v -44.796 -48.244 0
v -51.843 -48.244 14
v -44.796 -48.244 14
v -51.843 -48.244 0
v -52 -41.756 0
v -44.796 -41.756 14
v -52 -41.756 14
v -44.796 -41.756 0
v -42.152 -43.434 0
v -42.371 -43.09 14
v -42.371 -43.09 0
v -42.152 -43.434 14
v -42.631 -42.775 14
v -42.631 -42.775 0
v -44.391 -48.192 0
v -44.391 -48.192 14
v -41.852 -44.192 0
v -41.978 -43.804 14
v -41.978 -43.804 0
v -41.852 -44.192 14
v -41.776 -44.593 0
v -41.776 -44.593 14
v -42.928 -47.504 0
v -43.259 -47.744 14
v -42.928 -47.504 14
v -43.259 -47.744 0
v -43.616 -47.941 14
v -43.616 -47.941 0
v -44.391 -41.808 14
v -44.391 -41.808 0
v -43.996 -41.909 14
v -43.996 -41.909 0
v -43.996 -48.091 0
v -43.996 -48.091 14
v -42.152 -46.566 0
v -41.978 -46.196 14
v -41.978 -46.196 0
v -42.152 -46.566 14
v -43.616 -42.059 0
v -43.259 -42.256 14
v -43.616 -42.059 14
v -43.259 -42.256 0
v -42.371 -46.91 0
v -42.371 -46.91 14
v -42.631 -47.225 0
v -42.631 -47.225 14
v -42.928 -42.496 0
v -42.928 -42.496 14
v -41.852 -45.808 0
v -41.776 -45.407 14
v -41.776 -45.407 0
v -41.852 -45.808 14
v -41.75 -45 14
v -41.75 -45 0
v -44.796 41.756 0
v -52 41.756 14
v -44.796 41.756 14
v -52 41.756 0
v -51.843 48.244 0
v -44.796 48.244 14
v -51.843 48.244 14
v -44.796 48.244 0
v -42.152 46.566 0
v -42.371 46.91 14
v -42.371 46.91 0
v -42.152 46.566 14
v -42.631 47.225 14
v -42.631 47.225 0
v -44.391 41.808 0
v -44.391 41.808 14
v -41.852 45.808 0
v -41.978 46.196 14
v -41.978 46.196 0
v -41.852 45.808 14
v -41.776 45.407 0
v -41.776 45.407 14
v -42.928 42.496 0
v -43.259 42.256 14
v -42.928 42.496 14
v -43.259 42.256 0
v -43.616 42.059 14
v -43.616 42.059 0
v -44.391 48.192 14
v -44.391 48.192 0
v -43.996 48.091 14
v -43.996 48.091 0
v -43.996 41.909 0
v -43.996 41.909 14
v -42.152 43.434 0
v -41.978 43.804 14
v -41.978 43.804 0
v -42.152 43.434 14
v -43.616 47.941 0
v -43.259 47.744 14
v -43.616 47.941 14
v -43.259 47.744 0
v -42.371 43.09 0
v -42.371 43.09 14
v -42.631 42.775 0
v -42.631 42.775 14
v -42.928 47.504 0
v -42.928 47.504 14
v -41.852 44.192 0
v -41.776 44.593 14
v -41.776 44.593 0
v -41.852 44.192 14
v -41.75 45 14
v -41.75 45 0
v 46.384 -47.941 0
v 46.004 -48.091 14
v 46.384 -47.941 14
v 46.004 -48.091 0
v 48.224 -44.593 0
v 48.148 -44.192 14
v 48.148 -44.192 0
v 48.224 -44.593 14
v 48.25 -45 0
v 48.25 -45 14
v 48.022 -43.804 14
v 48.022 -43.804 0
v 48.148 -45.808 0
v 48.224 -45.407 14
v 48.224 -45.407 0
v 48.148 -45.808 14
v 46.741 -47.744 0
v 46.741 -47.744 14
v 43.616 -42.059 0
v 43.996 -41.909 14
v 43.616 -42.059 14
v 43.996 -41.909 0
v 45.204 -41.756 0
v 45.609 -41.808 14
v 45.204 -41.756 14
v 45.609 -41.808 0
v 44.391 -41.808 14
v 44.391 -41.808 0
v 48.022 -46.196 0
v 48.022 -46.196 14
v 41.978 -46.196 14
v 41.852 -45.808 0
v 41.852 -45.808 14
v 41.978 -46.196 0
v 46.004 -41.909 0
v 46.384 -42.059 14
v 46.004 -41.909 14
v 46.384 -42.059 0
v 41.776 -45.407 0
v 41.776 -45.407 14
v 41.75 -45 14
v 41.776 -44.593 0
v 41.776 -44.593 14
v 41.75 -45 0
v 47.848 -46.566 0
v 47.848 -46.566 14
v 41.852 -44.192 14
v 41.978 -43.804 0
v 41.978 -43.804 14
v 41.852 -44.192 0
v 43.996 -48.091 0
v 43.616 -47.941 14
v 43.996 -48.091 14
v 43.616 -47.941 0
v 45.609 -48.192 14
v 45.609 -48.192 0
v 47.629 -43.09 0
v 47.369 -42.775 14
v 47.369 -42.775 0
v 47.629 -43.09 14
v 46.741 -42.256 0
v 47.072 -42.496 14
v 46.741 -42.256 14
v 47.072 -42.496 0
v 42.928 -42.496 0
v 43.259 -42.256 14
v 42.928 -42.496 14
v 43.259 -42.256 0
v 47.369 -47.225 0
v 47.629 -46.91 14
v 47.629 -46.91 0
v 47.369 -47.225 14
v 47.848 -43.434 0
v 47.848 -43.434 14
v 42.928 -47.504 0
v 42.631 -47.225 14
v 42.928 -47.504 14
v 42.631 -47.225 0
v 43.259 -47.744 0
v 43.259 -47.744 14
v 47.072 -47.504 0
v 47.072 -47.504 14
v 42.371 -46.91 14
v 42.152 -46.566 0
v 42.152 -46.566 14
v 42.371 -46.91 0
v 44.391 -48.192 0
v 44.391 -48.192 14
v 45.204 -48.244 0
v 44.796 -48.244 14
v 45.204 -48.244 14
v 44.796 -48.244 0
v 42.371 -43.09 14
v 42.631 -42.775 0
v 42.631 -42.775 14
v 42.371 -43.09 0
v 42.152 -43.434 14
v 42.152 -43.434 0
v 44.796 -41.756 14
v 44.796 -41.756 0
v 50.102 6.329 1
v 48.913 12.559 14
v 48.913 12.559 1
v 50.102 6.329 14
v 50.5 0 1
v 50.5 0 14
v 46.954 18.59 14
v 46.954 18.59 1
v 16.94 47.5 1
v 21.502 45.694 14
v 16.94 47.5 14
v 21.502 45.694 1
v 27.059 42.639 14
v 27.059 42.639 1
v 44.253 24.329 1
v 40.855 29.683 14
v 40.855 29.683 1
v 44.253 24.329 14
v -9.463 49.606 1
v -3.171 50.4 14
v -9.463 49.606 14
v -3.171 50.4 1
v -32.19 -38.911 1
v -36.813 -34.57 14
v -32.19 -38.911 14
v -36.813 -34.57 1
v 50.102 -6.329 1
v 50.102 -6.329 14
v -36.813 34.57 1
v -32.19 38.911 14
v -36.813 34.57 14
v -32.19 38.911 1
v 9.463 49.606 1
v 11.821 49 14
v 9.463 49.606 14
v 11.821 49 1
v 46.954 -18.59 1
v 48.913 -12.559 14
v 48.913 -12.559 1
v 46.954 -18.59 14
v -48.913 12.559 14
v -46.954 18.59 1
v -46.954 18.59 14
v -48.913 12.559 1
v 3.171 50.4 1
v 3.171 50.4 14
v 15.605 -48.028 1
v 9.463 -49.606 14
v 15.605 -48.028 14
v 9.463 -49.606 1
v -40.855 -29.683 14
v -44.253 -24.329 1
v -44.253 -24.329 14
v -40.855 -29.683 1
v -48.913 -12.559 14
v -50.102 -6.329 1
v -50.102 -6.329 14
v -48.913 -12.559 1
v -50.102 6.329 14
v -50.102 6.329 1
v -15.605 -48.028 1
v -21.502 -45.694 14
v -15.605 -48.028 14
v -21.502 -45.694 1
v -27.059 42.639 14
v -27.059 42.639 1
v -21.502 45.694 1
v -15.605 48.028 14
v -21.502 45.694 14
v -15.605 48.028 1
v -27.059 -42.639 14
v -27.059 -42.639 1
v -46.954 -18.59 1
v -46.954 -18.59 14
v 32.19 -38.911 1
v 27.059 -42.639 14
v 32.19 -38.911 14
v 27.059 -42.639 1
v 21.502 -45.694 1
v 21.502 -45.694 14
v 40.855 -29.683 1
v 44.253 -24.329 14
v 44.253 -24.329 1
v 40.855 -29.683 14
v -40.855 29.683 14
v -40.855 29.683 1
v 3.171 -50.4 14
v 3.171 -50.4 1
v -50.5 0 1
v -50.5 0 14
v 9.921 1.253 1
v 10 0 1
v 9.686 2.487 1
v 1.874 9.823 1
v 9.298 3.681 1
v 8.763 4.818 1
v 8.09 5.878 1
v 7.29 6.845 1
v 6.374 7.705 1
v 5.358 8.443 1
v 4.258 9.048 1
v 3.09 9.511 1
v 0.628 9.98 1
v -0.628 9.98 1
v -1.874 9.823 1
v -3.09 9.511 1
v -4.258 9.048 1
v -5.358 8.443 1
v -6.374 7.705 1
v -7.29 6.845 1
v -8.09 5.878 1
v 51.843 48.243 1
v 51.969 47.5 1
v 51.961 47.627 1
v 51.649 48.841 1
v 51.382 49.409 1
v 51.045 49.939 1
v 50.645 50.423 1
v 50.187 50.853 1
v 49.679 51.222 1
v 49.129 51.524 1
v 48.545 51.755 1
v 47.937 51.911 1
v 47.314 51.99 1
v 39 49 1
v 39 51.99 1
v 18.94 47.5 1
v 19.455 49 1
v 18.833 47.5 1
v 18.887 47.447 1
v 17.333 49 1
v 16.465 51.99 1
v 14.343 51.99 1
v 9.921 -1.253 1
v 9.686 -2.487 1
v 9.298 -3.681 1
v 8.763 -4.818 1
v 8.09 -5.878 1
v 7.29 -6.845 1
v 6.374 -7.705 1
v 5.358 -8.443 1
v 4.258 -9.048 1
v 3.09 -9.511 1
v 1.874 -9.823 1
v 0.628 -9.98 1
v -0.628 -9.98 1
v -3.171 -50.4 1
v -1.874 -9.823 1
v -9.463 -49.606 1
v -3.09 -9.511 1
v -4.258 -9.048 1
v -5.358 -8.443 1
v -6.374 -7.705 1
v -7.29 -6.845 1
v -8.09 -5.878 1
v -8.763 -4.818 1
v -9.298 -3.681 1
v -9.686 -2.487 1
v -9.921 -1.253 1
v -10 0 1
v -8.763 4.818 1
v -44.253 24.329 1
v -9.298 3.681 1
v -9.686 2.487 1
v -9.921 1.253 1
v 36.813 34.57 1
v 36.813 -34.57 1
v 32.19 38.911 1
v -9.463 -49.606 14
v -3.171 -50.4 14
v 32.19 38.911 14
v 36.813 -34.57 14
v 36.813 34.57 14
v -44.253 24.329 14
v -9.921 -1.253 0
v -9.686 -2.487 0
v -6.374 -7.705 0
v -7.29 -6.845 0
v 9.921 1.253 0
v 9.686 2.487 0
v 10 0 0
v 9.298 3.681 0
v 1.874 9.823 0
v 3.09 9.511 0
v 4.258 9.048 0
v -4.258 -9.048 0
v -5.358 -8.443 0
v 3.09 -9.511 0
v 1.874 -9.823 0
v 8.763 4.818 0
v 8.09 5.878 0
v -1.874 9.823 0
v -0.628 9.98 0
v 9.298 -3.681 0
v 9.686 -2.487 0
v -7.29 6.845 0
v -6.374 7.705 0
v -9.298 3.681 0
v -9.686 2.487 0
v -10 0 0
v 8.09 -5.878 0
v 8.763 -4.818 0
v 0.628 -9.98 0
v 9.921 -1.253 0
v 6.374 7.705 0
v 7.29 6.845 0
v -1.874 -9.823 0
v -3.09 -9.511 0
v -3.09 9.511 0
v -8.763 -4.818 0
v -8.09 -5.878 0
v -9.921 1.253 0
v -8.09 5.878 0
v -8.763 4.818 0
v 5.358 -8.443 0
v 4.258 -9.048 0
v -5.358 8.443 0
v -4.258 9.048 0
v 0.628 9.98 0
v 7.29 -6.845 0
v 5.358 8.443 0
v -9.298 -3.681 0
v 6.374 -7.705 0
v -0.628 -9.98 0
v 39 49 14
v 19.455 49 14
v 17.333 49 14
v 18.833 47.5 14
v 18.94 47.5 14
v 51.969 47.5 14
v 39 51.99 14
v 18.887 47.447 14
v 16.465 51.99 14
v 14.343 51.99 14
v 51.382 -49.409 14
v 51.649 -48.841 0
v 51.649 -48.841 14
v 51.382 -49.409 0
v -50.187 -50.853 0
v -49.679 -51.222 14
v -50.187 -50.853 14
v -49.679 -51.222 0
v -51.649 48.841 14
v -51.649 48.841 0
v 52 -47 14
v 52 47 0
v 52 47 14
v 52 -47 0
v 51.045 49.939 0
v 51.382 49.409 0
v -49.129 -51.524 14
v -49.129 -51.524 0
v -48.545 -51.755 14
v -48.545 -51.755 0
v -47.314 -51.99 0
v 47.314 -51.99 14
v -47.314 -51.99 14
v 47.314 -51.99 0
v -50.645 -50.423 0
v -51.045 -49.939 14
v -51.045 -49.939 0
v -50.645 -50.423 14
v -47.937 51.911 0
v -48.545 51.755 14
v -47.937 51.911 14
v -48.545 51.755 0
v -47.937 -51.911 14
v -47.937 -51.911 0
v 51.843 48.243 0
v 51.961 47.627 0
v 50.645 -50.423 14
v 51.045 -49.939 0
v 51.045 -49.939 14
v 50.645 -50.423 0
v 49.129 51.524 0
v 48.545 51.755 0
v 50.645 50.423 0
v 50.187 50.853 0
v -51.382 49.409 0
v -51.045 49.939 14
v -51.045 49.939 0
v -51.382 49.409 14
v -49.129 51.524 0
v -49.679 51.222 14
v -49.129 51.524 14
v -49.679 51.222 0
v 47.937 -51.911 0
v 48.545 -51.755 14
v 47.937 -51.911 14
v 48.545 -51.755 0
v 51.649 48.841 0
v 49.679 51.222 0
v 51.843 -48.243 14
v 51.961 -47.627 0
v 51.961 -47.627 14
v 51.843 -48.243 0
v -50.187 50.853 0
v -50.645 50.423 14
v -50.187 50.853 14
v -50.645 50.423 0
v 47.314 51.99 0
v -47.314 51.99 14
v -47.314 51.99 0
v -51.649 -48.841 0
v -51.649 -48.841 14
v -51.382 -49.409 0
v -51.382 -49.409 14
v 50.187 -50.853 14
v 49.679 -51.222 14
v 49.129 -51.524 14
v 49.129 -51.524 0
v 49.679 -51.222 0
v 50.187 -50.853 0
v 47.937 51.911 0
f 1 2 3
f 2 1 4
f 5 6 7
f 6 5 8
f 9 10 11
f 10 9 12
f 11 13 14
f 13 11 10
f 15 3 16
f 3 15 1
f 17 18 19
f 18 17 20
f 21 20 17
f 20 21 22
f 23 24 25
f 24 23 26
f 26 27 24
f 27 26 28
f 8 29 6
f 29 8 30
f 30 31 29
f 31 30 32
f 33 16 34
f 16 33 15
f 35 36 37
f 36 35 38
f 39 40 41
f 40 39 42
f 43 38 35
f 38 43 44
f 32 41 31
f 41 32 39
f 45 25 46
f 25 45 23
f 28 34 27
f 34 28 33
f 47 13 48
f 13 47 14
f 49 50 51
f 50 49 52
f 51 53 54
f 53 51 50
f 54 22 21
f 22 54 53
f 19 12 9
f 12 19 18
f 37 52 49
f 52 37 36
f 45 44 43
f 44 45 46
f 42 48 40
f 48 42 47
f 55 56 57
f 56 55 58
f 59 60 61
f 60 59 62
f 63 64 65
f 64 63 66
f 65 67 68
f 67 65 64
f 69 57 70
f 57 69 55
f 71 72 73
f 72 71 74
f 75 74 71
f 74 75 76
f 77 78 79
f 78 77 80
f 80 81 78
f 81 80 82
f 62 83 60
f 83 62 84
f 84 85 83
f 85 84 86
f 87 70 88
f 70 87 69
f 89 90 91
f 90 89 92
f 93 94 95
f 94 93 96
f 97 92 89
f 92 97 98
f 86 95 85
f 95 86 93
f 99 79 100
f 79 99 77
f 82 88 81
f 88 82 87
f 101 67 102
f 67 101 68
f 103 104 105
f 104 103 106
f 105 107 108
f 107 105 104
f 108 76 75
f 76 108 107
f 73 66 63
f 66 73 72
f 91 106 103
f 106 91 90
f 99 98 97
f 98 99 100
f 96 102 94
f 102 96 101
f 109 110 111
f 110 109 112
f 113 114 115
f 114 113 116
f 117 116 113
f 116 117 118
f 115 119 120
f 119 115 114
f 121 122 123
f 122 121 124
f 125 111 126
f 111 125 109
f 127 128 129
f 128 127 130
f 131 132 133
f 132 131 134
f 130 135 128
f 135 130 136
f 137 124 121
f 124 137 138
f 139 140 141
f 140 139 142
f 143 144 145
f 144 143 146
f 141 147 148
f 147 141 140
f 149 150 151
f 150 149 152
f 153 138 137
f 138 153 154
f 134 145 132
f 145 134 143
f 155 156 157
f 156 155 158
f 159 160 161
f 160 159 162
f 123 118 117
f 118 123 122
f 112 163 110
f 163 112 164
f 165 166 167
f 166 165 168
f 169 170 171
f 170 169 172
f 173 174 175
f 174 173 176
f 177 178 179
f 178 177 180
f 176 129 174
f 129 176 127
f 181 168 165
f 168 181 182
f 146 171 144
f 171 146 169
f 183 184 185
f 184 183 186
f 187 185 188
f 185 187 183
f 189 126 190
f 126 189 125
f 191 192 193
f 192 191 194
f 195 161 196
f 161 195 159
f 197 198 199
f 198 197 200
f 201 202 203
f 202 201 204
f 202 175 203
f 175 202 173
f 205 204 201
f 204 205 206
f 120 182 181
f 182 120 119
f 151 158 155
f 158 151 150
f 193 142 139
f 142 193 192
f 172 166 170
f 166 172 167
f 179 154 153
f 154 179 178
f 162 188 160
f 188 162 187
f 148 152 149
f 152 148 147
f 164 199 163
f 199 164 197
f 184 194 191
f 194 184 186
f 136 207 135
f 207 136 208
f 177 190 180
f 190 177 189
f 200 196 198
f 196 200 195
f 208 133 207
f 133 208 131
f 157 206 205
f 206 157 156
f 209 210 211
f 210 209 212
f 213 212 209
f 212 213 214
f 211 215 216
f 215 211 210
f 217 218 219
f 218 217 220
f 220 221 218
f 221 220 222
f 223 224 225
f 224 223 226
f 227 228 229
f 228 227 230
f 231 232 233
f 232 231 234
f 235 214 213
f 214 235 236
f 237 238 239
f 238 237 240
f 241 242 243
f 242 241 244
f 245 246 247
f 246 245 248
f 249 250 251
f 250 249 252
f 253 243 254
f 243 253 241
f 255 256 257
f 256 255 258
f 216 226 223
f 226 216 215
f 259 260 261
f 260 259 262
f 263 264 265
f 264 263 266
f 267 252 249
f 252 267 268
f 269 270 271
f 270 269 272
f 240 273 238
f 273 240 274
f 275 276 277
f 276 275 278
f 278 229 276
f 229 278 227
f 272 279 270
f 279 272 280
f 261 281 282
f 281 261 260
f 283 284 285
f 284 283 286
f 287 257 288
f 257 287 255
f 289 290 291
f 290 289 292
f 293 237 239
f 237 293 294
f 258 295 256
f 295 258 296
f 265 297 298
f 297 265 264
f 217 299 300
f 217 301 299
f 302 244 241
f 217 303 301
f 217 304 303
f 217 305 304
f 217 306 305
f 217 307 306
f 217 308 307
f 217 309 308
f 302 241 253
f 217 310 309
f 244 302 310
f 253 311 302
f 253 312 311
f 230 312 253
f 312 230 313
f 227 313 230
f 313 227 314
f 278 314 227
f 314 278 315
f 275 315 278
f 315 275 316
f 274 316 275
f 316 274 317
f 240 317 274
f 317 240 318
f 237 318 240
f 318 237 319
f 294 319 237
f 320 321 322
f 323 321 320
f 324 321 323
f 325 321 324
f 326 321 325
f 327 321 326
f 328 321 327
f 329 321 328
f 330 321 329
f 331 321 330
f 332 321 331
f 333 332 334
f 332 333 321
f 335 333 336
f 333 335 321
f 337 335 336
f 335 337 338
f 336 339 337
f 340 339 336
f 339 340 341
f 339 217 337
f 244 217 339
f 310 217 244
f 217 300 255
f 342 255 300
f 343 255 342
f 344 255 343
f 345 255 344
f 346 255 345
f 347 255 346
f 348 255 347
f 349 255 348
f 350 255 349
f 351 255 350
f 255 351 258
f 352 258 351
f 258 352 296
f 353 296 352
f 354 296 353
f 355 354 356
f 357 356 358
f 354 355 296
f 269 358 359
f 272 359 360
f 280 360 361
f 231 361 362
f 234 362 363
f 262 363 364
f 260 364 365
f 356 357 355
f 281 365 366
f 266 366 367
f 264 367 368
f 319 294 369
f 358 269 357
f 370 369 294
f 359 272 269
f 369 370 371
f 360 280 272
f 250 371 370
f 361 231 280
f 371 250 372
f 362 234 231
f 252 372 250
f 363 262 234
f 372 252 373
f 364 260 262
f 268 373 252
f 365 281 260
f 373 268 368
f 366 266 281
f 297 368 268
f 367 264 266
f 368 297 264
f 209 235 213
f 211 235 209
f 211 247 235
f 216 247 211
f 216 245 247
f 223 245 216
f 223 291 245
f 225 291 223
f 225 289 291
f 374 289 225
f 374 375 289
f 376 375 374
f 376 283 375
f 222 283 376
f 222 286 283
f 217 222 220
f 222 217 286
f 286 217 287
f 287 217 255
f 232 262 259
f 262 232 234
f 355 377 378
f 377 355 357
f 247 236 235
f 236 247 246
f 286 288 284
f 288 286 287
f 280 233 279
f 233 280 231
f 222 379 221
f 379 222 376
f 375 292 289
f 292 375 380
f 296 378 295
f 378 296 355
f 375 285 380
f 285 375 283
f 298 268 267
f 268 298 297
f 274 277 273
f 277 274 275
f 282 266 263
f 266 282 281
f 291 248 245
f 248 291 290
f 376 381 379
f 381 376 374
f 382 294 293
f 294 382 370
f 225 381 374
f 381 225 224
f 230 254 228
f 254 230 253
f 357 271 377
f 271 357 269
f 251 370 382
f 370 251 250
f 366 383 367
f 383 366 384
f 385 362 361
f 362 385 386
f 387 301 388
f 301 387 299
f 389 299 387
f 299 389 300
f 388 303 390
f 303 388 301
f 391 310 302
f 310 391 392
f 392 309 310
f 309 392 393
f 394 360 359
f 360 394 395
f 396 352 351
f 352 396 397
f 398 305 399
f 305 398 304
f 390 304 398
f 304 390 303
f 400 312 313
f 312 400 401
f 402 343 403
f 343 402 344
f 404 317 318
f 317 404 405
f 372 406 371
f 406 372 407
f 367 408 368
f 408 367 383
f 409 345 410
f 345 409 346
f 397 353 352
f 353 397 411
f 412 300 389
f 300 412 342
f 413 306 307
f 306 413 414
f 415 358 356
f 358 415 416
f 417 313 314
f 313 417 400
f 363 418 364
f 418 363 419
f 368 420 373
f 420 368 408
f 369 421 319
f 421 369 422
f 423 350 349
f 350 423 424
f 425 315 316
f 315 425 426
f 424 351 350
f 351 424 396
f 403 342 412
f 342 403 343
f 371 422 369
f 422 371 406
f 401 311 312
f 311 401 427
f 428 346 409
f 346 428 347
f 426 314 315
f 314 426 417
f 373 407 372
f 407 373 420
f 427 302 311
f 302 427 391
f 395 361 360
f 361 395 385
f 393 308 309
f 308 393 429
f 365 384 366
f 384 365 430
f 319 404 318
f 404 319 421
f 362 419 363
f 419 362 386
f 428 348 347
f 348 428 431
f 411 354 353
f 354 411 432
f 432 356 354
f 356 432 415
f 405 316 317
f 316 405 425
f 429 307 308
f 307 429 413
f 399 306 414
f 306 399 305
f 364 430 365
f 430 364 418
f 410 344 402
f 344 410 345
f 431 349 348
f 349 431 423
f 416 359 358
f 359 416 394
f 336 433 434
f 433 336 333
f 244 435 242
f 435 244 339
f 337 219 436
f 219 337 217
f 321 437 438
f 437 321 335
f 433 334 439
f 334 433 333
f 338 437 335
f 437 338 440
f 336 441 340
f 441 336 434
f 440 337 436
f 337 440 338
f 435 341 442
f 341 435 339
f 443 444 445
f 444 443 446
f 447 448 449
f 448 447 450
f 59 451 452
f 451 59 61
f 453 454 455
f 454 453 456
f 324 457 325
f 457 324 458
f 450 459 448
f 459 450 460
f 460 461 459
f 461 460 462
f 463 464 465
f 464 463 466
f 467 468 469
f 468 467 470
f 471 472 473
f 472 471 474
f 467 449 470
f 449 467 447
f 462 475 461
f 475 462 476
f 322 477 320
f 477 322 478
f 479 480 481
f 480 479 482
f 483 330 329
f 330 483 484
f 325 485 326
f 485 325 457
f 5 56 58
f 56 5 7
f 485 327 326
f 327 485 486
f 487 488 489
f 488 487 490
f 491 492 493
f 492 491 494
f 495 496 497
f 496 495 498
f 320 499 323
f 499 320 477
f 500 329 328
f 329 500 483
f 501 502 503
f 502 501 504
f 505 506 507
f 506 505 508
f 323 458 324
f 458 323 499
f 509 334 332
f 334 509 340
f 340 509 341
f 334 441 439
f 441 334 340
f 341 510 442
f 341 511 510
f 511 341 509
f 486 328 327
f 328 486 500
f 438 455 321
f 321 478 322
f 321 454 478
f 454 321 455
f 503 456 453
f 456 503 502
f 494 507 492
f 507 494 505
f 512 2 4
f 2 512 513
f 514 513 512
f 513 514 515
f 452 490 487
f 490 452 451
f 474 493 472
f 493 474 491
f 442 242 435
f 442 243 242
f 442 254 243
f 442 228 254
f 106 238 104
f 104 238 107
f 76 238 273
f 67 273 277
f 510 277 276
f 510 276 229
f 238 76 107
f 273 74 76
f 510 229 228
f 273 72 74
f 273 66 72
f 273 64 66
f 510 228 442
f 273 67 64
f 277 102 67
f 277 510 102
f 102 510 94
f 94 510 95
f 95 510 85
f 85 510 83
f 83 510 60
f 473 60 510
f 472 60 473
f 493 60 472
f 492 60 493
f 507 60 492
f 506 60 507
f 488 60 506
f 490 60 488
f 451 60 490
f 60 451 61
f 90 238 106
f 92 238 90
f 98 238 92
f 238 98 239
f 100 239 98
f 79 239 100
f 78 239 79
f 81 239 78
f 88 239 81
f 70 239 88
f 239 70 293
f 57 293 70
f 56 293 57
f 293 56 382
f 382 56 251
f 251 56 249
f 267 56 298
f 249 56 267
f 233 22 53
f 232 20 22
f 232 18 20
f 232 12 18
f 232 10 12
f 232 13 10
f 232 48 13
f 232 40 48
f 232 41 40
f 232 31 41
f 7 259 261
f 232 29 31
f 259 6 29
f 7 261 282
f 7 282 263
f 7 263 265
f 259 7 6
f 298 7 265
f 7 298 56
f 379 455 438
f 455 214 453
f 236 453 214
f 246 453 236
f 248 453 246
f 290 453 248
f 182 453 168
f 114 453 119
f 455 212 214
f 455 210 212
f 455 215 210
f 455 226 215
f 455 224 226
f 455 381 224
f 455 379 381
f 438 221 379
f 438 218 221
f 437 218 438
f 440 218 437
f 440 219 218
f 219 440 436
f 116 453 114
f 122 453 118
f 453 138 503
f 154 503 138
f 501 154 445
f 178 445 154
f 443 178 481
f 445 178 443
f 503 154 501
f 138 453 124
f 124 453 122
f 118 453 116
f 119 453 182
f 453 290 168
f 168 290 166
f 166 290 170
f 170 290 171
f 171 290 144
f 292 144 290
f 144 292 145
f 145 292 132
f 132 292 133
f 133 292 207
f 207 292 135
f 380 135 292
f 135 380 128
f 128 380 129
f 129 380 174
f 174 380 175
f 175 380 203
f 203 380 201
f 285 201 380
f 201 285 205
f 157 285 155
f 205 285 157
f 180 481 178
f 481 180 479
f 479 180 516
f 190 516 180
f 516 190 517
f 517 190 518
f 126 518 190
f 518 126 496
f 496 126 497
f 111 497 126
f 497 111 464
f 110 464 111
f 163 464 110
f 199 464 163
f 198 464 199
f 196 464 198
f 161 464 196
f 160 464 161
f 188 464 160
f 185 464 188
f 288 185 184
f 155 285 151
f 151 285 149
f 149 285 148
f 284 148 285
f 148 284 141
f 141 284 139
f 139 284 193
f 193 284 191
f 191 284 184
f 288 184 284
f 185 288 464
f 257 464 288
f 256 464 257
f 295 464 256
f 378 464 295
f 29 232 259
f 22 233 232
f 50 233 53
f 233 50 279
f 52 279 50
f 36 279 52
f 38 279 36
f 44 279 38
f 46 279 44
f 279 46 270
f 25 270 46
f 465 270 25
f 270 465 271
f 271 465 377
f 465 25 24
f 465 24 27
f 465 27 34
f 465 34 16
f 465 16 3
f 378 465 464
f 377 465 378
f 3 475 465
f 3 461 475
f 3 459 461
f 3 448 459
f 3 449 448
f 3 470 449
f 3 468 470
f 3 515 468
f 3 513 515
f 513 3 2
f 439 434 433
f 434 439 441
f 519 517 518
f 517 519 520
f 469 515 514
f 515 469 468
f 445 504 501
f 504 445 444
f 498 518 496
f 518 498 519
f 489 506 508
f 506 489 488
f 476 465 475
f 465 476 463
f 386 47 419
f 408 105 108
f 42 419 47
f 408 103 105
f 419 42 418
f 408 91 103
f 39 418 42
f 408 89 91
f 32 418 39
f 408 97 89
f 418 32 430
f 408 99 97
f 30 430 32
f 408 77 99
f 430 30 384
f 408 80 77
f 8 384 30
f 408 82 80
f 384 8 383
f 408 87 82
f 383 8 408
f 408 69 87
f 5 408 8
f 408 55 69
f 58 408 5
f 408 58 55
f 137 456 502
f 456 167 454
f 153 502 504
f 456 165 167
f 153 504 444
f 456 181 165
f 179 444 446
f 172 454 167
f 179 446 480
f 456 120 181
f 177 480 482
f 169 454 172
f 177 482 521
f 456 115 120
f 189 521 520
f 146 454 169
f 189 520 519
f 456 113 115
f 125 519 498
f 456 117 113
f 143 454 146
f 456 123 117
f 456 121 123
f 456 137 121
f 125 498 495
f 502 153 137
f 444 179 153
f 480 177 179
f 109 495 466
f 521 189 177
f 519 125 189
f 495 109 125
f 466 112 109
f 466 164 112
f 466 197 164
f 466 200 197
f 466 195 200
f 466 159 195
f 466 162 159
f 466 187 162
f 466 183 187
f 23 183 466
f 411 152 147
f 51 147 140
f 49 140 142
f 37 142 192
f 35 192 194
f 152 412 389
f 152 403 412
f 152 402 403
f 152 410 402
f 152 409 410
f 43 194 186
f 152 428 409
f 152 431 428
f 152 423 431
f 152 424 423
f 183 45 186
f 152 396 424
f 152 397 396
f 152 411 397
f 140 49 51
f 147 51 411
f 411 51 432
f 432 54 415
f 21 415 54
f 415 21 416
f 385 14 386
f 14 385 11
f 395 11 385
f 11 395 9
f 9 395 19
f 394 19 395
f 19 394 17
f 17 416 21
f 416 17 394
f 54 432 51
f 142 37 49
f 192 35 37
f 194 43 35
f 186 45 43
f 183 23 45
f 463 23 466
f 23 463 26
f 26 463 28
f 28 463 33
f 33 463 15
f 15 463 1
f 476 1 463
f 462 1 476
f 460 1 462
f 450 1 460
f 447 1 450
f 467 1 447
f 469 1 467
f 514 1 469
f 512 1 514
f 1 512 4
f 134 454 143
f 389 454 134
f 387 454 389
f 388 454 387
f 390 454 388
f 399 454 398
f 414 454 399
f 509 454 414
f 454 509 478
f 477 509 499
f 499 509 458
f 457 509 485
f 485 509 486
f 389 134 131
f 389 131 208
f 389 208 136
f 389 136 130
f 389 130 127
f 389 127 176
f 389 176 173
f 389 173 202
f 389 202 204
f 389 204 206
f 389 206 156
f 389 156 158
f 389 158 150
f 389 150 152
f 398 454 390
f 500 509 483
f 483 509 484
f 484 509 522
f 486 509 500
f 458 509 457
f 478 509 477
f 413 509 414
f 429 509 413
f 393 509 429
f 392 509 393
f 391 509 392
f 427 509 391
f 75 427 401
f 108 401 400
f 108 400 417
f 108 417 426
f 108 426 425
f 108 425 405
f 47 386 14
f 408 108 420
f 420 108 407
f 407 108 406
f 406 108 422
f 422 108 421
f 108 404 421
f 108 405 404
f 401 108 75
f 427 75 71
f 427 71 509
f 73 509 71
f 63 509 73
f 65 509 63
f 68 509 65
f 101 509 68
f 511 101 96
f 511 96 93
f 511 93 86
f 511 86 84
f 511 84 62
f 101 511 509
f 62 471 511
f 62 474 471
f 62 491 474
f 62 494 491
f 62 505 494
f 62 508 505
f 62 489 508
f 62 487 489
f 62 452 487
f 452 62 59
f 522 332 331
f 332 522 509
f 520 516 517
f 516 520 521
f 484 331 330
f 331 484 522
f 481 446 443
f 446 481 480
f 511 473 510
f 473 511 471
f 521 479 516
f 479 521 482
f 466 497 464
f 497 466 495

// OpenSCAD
$fn = 50;


difference() {
	union() {
		translate(v = [0, 0, 0]) {
			rotate(a = [0, 0, 0]) {
				hull() {
					translate(v = [-47.0000000000, 47.0000000000, 0]) {
						rotate(a = [0, 0, 0]) {
							translate(v = [0, 0, 0]) {
								rotate(a = [0, 0, 0]) {
									cylinder(h = 14, r = 5);
								}
							}
						}
					}
					translate(v = [47.0000000000, 47.0000000000, 0]) {
						rotate(a = [0, 0, 0]) {
							translate(v = [0, 0, 0]) {
								rotate(a = [0, 0, 0]) {
									cylinder(h = 14, r = 5);
								}
							}
						}
					}
					translate(v = [-47.0000000000, -47.0000000000, 0]) {
						rotate(a = [0, 0, 0]) {
							translate(v = [0, 0, 0]) {
								rotate(a = [0, 0, 0]) {
									cylinder(h = 14, r = 5);
								}
							}
						}
					}
					translate(v = [47.0000000000, -47.0000000000, 0]) {
						rotate(a = [0, 0, 0]) {
							translate(v = [0, 0, 0]) {
								rotate(a = [0, 0, 0]) {
									cylinder(h = 14, r = 5);
								}
							}
						}
					}
				}
			}
		}
	}
	union() {
		translate(v = [-52.5000000000, -45.0000000000, -125]) {
			rotate(a = [0, 0, 0]) {
				hull() {
					translate(v = [7.5000000000, 0, 0]) {
						rotate(a = [0, 0, 0]) {
							translate(v = [0, 0, 0]) {
								rotate(a = [0, 0, 0]) {
									cylinder(h = 250, r = 3.2500000000);
								}
							}
						}
					}
					translate(v = [-7.5000000000, 0, 0]) {
						rotate(a = [0, 0, 0]) {
							translate(v = [0, 0, 0]) {
								rotate(a = [0, 0, 0]) {
									cylinder(h = 250, r = 3.2500000000);
								}
							}
						}
					}
				}
			}
		}
		translate(v = [-52.5000000000, 45.0000000000, -125]) {
			rotate(a = [0, 0, 0]) {
				hull() {
					translate(v = [7.5000000000, 0, 0]) {
						rotate(a = [0, 0, 0]) {
							translate(v = [0, 0, 0]) {
								rotate(a = [0, 0, 0]) {
									cylinder(h = 250, r = 3.2500000000);
								}
							}
						}
					}
					translate(v = [-7.5000000000, 0, 0]) {
						rotate(a = [0, 0, 0]) {
							translate(v = [0, 0, 0]) {
								rotate(a = [0, 0, 0]) {
									cylinder(h = 250, r = 3.2500000000);
								}
							}
						}
					}
				}
			}
		}
		translate(v = [45.0000000000, -45.0000000000, -125.0000000000]) {
			rotate(a = [0, 0, 0]) {
				cylinder(h = 250, r = 3.2500000000);
			}
		}
		translate(v = [0, 0, 1.0000000000]) {
			rotate(a = [0, 0, 0]) {
				cylinder(h = 16, r = 50.5000000000);
			}
		}
		translate(v = [0, 0, -7.0000000000]) {
			rotate(a = [0, 0, 0]) {
				cylinder(h = 14, r = 10.0000000000);
			}
		}
		translate(v = [0.0000000000, 47.5000000000, 1]) {
			rotate(a = [0, 0, 0]) {
				cube(size = [52.0000000000, 1.5000000000, 16]);
			}
		}
		translate(v = [39.0000000000, 47.5000000000, 1]) {
			rotate(a = [0, 0, 0]) {
				cube(size = [13.0000000000, 4.5000000000, 16]);
			}
		}
		translate(v = [13.5833333333, 52.7500000000, 1]) {
			rotate(a = [0, 0, -45]) {
				cube(size = [7.5000000000, 1.5000000000, 16]);
			}
		}
	}
}
